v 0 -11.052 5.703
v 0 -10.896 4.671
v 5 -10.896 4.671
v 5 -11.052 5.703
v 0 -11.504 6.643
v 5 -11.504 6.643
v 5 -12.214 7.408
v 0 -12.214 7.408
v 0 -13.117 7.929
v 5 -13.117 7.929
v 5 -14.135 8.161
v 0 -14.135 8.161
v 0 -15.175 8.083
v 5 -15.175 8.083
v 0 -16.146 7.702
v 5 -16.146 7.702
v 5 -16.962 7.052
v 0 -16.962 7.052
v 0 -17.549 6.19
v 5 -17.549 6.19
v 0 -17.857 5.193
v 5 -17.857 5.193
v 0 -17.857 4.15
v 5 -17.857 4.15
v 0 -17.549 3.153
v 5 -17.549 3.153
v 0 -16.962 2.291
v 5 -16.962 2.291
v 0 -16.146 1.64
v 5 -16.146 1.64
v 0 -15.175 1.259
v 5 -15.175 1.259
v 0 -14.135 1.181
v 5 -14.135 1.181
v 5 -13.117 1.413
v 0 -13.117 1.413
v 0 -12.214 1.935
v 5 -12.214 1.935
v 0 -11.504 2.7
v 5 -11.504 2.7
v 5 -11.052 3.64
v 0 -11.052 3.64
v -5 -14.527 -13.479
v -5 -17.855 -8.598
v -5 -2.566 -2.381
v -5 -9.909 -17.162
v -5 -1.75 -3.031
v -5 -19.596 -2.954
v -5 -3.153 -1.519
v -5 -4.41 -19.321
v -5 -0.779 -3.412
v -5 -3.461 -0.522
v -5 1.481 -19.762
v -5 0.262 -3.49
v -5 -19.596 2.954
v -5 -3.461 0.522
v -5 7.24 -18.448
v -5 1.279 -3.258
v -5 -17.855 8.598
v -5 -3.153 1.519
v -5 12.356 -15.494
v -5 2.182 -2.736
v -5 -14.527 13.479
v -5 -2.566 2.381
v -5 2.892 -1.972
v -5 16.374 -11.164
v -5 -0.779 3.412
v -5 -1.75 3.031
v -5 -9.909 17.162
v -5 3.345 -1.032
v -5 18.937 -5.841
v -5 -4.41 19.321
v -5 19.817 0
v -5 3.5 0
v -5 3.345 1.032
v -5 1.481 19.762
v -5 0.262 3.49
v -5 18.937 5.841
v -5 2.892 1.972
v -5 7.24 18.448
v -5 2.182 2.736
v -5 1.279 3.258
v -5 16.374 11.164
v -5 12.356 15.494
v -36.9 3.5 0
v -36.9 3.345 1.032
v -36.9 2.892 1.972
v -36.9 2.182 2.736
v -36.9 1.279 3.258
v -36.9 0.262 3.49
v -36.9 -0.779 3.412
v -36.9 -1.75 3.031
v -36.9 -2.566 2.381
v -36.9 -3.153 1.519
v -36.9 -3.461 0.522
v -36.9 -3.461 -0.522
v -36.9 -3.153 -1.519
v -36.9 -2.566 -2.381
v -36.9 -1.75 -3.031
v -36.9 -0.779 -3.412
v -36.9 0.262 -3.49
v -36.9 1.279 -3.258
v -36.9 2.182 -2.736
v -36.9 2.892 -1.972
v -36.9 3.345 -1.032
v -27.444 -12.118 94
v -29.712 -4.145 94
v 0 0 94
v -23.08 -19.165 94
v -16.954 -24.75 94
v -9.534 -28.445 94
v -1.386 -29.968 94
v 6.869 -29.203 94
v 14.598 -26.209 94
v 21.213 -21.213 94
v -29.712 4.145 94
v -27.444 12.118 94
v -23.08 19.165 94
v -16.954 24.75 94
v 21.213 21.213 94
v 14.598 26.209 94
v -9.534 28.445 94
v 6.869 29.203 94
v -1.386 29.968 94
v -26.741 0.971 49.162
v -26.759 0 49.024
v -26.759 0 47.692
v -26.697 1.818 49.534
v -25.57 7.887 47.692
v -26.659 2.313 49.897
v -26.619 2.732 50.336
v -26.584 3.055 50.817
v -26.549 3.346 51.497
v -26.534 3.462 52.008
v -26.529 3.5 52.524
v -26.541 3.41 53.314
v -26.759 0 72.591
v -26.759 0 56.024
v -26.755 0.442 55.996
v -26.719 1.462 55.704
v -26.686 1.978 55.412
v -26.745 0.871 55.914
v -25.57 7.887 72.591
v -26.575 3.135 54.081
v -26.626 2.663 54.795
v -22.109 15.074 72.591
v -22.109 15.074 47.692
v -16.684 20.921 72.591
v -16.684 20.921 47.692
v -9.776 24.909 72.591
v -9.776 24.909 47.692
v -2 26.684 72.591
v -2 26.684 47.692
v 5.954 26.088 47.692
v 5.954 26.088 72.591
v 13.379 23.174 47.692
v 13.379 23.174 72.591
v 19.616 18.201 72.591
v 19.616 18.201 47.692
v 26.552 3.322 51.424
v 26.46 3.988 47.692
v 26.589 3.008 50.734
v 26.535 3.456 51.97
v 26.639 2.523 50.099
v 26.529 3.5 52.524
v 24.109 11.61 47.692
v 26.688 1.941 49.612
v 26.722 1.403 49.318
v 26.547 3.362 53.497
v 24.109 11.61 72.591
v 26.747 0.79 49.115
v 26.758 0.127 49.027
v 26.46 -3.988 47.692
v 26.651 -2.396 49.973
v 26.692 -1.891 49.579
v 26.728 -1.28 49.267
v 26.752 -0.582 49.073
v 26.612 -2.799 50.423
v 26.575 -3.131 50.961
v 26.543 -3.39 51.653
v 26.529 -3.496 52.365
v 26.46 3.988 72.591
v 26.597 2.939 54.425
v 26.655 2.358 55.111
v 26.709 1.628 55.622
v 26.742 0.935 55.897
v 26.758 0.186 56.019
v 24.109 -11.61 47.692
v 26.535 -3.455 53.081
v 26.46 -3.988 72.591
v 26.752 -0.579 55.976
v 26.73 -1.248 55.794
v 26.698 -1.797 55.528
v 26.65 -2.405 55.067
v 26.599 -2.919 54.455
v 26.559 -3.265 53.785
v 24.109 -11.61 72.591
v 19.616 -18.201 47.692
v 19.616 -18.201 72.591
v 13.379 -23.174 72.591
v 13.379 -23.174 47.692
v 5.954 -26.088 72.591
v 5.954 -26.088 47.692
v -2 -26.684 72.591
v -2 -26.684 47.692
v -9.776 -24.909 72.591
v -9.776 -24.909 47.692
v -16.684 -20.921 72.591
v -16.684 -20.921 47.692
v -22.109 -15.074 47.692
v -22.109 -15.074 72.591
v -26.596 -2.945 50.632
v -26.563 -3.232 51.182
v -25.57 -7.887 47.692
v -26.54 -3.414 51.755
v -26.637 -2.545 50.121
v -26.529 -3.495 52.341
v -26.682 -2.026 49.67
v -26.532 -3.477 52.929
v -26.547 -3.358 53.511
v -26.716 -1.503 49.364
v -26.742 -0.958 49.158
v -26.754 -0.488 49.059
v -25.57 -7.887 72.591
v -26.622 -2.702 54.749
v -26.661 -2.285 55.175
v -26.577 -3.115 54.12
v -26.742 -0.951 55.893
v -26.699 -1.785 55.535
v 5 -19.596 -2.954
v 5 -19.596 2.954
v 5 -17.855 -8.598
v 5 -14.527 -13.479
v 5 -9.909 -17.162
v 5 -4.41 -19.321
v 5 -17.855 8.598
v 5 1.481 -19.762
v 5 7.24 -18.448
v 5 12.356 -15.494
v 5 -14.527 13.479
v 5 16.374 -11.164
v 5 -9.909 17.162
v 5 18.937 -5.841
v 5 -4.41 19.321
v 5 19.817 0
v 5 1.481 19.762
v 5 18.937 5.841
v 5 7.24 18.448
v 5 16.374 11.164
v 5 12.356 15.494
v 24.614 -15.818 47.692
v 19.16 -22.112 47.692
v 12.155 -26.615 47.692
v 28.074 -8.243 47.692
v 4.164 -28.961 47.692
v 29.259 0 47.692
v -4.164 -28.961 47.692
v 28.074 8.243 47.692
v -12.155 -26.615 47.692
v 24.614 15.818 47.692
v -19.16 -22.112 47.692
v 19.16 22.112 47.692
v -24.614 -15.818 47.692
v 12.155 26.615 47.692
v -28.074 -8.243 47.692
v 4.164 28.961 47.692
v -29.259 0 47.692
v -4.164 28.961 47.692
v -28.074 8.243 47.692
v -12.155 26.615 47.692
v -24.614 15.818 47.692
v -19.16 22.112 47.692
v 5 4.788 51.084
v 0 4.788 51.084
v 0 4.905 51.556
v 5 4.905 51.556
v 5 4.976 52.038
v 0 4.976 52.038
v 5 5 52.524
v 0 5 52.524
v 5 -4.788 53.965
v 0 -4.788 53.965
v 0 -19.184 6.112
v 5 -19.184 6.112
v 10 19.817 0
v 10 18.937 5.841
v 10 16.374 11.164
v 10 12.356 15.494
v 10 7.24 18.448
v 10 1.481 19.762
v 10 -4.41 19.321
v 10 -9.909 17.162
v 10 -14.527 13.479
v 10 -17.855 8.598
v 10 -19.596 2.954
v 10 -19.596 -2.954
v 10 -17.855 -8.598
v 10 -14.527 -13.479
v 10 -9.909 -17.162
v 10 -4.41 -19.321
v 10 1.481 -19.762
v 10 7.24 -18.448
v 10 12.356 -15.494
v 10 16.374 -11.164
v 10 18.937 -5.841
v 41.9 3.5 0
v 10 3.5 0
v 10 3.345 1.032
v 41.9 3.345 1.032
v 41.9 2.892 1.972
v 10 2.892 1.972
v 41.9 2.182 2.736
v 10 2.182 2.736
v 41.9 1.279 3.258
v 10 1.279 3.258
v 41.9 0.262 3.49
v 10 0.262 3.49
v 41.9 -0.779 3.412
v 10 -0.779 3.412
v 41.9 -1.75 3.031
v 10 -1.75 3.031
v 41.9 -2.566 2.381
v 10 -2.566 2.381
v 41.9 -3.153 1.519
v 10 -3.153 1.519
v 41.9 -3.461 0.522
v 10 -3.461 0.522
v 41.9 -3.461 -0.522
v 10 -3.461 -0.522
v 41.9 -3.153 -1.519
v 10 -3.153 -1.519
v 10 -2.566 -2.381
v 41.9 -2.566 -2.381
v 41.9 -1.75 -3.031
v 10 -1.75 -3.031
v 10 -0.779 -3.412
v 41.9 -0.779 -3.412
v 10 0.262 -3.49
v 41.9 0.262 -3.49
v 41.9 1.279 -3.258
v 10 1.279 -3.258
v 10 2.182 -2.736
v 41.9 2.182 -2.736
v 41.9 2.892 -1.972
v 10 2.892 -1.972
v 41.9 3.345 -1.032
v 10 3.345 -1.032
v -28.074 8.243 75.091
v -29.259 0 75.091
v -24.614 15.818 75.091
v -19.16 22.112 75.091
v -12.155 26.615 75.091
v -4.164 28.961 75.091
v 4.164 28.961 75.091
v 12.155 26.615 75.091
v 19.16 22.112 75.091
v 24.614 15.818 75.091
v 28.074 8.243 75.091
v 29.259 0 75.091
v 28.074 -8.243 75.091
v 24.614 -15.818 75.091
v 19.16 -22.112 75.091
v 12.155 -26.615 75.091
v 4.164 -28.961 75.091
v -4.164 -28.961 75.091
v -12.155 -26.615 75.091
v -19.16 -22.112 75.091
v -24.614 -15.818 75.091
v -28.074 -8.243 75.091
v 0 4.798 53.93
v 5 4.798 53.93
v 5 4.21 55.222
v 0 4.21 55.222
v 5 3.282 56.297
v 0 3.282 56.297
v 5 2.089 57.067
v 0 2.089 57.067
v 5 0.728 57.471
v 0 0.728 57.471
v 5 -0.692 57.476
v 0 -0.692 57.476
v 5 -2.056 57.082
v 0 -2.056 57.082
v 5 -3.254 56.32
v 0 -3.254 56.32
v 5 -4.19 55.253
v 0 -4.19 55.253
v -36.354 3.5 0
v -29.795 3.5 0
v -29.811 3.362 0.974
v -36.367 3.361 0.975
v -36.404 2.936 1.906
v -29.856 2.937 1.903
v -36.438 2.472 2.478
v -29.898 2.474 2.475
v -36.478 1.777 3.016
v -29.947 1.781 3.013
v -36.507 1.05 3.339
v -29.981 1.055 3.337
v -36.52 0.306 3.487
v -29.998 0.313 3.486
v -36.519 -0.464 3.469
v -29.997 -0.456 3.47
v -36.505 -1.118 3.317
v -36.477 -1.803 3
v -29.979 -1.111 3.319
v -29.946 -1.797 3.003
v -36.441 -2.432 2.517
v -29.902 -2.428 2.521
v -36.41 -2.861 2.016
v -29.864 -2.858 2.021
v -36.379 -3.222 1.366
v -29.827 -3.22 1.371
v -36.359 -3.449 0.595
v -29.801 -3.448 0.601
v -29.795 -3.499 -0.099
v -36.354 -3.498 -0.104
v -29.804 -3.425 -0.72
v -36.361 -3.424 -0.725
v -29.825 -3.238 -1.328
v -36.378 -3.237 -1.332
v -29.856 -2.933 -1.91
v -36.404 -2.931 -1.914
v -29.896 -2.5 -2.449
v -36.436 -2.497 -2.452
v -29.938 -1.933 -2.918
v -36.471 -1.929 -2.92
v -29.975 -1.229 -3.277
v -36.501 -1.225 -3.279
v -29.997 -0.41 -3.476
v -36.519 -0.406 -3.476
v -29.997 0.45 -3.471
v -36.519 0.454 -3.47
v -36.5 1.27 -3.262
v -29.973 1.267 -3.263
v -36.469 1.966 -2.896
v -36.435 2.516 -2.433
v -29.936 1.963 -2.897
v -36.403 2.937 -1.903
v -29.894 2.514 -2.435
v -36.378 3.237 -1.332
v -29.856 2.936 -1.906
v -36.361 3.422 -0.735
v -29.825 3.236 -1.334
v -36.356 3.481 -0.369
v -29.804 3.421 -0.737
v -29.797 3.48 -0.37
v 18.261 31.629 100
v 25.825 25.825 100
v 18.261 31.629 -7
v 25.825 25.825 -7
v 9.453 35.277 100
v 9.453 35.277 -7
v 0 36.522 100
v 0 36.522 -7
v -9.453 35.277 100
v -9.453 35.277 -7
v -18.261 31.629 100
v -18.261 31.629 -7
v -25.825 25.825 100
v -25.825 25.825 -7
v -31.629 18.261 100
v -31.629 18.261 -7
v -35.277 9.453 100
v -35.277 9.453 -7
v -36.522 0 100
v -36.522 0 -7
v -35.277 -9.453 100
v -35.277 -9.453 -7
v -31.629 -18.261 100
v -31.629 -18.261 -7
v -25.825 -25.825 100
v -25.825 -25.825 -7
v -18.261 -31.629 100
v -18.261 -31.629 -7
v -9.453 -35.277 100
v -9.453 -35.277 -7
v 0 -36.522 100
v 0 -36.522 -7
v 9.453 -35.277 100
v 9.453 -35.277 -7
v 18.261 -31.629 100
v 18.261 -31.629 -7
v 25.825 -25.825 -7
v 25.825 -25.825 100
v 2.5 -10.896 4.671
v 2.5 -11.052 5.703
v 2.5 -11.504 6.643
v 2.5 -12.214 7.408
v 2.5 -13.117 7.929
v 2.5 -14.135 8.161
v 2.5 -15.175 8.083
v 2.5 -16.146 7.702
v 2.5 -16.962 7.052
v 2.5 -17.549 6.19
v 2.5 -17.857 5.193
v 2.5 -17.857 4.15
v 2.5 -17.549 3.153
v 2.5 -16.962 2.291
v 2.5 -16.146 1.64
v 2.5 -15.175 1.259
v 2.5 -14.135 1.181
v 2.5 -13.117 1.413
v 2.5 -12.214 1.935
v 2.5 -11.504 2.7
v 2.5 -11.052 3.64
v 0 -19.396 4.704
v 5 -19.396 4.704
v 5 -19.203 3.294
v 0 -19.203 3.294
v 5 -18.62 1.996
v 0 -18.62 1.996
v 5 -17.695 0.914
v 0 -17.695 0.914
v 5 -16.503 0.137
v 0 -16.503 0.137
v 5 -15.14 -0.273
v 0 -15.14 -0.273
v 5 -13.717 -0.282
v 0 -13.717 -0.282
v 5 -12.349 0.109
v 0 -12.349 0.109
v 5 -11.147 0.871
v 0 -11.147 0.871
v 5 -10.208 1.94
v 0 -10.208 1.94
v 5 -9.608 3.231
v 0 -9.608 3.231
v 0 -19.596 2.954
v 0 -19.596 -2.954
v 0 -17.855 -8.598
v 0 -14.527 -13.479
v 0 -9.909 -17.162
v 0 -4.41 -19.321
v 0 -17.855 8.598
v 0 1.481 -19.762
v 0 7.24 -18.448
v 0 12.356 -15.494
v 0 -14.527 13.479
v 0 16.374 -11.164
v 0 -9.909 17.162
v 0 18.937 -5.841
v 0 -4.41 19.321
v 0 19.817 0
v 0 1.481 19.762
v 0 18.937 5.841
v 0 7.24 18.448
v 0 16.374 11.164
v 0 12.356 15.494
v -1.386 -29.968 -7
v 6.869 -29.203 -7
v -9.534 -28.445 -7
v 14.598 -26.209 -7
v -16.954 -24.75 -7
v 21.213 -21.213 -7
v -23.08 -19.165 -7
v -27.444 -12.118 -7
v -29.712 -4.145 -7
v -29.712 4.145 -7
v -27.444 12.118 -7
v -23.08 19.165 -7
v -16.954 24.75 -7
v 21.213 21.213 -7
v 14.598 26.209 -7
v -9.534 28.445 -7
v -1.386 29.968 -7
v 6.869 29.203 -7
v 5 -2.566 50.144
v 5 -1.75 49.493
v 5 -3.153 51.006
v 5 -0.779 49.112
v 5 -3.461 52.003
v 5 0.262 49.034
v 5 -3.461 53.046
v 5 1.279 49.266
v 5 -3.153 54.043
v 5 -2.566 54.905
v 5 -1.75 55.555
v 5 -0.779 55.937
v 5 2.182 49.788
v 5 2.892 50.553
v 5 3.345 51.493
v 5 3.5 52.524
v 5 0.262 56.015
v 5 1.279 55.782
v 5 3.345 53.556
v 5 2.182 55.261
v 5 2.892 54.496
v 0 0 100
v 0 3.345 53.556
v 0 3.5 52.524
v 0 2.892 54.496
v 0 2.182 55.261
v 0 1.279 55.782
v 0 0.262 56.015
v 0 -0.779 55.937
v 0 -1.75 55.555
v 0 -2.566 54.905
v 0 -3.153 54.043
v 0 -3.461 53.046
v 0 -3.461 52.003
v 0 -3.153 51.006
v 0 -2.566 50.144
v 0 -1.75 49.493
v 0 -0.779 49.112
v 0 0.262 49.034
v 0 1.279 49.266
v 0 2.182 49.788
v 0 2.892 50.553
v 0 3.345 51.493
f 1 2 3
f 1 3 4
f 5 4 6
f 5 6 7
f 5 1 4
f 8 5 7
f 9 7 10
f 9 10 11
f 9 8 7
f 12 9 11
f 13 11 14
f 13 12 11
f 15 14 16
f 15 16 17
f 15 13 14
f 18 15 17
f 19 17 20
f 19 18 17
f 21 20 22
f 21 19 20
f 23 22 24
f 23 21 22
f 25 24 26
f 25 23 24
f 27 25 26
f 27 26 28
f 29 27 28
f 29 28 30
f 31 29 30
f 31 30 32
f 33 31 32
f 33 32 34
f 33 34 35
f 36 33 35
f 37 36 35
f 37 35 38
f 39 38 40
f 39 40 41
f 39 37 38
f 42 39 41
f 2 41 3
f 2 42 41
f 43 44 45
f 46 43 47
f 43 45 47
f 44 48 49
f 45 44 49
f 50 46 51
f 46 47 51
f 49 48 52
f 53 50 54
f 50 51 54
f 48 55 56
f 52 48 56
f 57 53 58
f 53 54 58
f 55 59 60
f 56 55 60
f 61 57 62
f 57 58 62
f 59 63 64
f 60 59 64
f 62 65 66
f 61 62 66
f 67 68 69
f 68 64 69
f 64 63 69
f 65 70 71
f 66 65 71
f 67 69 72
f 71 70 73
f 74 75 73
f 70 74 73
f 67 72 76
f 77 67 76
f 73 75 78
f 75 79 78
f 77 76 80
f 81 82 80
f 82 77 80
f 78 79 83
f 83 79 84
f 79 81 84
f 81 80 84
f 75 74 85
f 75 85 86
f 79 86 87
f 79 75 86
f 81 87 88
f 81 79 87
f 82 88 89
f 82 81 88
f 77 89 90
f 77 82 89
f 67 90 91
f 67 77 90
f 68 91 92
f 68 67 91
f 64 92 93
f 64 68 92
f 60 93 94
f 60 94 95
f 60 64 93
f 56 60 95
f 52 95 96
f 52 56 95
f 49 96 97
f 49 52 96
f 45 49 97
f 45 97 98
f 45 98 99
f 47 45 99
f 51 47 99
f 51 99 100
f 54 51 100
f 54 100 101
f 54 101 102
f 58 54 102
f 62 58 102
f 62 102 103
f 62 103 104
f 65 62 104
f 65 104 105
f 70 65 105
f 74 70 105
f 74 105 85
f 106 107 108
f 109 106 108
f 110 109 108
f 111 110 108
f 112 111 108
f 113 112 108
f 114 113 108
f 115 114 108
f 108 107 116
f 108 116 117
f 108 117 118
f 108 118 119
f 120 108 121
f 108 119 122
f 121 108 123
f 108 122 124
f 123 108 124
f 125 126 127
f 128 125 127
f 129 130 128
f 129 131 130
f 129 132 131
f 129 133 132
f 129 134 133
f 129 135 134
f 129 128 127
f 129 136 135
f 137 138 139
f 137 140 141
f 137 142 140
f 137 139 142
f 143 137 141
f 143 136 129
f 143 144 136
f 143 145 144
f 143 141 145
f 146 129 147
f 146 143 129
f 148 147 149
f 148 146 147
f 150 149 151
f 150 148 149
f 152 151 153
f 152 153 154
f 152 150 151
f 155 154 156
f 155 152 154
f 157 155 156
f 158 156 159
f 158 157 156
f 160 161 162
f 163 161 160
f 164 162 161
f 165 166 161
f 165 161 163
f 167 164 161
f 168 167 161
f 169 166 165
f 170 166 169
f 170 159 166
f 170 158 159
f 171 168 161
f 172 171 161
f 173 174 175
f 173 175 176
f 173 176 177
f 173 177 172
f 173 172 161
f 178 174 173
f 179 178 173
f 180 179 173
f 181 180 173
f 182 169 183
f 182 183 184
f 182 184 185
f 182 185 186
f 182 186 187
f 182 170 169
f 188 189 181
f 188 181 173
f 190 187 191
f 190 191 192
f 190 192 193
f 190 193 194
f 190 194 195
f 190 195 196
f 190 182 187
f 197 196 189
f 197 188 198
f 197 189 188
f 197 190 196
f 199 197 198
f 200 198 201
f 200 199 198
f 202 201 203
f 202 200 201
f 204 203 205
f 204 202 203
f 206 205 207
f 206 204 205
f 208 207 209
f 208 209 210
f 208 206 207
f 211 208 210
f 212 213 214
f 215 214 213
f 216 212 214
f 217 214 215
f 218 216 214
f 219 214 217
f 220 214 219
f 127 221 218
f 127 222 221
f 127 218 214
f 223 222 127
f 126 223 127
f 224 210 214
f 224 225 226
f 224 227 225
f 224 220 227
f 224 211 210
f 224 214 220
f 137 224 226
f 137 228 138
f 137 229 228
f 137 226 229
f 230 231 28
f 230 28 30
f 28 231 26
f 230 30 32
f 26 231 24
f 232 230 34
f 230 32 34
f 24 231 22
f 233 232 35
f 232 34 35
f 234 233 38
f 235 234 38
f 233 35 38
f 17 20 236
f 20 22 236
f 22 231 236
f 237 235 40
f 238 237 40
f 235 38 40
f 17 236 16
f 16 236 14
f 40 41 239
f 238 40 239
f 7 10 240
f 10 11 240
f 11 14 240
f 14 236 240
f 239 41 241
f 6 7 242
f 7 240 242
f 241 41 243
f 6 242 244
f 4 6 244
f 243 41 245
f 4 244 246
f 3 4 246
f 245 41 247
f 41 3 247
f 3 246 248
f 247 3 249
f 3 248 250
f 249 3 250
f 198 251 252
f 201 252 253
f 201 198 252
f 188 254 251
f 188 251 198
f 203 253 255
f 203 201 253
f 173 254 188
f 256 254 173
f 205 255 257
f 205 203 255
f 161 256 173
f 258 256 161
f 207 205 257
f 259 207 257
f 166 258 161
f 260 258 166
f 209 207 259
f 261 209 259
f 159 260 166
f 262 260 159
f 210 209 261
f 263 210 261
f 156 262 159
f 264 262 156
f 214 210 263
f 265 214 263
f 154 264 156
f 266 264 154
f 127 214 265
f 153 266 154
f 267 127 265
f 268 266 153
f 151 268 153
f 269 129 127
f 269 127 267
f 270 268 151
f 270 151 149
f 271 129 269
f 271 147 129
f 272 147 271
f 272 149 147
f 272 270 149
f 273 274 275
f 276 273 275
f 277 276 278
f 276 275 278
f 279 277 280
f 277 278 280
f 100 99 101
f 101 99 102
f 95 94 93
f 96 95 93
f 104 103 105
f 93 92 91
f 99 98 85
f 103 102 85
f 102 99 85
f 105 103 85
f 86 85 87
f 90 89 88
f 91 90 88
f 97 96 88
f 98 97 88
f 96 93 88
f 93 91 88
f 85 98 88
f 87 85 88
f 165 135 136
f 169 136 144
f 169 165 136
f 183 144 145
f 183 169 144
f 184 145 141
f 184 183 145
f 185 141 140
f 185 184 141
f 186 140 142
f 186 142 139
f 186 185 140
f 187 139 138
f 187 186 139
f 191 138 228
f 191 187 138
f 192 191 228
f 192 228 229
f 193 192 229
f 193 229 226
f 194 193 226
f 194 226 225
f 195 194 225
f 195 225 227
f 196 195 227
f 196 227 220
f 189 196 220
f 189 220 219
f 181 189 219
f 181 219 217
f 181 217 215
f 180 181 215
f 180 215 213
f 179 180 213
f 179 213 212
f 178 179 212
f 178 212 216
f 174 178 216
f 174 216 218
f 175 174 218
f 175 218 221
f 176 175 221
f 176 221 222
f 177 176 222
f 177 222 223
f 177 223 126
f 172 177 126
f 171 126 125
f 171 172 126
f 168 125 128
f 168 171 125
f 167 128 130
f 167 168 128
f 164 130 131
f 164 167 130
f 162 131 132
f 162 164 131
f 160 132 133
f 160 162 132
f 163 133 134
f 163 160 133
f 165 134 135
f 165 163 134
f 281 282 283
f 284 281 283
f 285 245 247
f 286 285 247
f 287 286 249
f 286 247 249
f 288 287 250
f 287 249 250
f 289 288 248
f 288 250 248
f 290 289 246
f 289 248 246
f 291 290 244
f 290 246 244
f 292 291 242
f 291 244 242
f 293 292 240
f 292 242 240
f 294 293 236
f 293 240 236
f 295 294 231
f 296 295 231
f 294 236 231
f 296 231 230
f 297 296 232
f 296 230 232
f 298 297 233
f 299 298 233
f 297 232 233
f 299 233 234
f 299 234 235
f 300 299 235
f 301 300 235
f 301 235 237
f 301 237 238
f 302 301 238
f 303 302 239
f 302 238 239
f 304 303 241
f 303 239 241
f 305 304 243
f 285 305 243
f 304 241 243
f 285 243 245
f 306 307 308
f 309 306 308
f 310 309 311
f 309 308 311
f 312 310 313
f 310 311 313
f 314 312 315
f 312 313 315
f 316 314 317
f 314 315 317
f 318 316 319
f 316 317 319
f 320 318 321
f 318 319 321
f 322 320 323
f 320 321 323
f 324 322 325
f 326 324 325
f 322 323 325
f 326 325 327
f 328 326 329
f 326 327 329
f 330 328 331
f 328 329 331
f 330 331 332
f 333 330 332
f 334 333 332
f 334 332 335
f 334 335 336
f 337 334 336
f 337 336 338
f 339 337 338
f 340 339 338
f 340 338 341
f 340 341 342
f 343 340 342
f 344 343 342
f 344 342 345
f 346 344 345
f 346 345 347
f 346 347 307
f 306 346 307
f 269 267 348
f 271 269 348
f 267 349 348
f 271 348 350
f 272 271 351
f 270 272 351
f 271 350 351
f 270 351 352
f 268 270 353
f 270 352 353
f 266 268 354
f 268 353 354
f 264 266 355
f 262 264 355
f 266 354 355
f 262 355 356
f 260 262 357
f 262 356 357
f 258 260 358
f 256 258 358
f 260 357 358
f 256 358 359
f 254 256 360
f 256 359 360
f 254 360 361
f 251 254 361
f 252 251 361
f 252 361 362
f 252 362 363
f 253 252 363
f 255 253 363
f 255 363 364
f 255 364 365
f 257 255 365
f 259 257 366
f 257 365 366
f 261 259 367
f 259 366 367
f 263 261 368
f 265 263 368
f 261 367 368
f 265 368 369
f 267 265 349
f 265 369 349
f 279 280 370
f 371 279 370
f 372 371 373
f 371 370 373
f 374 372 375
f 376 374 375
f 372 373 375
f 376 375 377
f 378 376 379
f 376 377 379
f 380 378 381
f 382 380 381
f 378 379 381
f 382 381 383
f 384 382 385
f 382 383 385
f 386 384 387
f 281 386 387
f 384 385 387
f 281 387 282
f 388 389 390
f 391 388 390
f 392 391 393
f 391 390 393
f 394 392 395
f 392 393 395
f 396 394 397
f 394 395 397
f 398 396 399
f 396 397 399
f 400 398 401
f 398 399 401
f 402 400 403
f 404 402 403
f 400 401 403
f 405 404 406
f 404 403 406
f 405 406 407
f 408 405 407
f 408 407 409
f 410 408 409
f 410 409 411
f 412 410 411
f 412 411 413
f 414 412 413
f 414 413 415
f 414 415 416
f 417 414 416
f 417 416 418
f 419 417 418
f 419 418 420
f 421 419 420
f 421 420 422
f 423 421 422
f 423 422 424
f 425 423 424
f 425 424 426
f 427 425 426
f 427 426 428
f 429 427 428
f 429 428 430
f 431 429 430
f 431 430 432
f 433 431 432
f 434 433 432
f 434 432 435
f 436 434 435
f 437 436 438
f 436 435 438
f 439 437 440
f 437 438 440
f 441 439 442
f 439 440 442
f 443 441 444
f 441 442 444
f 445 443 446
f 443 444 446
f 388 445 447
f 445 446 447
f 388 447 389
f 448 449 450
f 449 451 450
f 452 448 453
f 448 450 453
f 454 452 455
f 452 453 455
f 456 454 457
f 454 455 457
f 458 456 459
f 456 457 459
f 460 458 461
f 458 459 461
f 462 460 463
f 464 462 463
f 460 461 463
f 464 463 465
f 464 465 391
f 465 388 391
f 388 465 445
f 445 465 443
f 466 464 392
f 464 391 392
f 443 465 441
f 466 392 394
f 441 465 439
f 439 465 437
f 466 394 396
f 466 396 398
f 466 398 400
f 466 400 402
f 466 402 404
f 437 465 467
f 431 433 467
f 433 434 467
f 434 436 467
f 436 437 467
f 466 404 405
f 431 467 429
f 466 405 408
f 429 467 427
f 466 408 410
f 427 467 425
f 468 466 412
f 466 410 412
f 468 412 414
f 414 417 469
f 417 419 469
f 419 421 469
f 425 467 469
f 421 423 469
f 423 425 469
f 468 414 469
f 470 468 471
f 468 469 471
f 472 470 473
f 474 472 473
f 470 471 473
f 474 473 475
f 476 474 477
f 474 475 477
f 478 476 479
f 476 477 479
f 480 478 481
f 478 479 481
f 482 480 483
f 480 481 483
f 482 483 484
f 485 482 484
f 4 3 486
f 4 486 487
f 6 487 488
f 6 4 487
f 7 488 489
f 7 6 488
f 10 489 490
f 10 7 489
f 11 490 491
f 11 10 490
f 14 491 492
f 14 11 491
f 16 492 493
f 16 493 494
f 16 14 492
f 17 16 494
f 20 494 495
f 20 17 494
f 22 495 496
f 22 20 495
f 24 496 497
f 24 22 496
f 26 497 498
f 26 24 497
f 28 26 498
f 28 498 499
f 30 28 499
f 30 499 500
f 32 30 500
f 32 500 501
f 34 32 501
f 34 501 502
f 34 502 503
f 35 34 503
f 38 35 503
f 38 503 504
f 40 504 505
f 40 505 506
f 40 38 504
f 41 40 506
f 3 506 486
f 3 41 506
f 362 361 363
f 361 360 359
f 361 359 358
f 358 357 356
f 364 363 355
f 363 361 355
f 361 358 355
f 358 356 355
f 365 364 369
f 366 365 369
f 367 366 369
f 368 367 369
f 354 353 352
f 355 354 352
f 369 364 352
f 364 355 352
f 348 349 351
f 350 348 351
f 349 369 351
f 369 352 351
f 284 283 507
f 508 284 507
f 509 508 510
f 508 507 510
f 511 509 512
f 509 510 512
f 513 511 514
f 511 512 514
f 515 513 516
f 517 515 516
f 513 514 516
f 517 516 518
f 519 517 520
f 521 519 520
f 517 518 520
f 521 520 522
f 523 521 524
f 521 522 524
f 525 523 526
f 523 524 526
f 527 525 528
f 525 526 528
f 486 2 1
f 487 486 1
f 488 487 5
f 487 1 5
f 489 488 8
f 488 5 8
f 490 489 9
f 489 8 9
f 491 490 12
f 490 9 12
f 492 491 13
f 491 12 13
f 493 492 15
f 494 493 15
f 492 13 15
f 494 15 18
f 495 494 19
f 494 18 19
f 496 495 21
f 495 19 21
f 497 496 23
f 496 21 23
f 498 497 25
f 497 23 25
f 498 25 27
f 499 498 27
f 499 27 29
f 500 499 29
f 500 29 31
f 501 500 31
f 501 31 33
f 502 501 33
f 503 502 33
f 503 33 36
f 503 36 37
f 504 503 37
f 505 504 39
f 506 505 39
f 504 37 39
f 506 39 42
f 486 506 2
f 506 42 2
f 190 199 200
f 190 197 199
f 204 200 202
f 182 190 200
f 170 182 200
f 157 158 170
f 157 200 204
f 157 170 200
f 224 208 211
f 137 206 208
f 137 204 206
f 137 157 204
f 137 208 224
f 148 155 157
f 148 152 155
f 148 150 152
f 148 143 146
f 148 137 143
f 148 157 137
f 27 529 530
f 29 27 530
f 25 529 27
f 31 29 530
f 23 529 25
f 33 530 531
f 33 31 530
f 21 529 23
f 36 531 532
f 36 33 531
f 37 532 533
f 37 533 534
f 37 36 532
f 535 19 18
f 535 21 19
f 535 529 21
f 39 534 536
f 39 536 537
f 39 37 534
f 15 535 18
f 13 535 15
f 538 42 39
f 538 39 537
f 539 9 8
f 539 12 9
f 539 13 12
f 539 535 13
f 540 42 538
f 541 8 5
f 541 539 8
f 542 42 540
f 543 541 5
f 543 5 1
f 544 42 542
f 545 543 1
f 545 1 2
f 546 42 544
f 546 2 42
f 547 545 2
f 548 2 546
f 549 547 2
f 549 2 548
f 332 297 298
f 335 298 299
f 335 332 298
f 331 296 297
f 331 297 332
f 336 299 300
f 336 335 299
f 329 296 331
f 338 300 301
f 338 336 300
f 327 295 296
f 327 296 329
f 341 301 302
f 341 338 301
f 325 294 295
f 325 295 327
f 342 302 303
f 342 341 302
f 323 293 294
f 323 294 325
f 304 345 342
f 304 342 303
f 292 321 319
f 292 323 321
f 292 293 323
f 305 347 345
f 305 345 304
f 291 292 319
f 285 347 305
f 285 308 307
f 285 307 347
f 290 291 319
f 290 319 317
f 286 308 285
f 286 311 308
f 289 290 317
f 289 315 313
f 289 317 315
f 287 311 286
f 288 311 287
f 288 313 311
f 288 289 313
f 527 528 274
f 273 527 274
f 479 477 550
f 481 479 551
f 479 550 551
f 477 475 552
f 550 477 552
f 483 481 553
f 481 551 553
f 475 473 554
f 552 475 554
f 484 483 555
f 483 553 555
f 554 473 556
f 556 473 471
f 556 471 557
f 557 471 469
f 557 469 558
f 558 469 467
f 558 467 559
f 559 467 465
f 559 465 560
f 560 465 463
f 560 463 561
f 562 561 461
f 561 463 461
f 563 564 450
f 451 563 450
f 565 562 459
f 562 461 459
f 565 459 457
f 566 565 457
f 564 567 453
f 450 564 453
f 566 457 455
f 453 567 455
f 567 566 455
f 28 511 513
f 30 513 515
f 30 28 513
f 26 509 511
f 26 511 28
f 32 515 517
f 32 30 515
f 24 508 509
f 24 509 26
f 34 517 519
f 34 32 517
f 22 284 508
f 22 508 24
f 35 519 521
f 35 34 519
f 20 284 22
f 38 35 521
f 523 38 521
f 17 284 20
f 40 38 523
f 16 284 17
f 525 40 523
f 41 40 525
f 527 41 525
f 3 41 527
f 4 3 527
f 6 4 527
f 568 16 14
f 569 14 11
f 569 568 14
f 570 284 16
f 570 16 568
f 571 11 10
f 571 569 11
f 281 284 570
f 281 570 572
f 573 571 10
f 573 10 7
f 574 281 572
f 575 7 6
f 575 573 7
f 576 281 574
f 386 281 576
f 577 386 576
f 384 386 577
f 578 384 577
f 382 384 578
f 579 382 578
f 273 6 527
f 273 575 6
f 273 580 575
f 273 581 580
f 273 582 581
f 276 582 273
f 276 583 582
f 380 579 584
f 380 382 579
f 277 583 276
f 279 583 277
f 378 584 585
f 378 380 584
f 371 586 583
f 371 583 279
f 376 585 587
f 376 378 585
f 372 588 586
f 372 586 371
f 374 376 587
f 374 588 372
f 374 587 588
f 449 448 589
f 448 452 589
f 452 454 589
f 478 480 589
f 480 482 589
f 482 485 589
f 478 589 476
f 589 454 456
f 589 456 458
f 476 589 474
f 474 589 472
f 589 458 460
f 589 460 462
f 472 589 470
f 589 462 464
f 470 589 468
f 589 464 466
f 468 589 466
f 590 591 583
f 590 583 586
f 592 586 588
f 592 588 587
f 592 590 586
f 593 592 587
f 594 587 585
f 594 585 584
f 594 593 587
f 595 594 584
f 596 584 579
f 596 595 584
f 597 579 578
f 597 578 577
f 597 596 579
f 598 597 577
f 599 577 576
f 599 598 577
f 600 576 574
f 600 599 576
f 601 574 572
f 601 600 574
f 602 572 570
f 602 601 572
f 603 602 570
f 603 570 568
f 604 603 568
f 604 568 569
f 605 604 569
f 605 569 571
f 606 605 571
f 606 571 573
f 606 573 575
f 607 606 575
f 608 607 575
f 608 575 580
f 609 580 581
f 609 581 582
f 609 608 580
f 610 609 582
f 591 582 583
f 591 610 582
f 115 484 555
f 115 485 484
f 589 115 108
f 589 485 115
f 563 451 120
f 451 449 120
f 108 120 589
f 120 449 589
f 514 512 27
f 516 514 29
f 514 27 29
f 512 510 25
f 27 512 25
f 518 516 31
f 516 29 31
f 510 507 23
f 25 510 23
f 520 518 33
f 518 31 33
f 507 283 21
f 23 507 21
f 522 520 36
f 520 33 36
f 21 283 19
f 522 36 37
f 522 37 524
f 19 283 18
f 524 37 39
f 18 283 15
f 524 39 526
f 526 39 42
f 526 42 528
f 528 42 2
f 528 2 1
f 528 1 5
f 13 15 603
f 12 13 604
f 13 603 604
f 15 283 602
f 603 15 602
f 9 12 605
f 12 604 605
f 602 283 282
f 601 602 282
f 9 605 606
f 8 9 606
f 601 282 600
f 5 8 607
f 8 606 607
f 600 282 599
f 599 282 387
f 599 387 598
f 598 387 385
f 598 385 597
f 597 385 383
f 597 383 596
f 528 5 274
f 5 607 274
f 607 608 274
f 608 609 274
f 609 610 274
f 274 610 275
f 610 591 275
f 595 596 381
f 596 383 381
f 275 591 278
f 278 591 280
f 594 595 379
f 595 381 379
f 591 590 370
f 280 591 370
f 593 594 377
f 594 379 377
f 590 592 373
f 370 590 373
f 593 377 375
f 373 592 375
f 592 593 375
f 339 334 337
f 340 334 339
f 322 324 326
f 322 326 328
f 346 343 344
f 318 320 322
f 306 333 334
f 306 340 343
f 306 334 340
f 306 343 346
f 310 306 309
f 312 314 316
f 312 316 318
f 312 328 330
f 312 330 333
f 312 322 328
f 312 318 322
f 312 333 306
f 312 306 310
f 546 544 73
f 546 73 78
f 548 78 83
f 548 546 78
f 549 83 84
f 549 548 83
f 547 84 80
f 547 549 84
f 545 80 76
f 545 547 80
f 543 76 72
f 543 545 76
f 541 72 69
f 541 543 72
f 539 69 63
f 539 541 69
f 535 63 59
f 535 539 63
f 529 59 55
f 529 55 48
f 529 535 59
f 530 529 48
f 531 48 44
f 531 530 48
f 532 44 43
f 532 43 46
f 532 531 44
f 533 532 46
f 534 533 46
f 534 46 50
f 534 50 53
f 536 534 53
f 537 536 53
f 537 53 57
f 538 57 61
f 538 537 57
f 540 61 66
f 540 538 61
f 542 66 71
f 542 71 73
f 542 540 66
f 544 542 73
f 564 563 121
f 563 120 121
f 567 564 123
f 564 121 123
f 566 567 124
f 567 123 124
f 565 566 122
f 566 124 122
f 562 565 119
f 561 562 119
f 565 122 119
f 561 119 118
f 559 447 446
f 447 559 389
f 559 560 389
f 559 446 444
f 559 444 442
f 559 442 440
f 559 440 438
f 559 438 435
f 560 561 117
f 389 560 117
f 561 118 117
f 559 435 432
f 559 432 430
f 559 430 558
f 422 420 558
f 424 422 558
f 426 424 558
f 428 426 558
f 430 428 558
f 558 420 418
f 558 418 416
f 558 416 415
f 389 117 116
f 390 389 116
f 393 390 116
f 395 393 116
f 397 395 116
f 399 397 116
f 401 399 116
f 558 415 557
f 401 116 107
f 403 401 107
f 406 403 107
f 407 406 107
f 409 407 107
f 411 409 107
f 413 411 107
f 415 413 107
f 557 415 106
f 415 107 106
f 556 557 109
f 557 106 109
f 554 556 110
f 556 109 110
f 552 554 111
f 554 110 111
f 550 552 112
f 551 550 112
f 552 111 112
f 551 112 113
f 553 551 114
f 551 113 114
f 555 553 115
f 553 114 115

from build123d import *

# Parameters (mm, degrees)
F1_ANGLE_BACK = 135
F1_ANGLE      = 270
F2_R          = 3.5
F3_DEPTH      = 36.5227397509
F4_R          = 3.5
F5_DEPTH      = 36.9
F6_R          = 19.8174846099
F7_DEPTH      = 5
F8_R          = 3.5
F9_DEPTH      = 2.5
F10_W         = 29.2587447912
F10_H         = 27.3991972208
F12_T         = -2.5
F13_R         = 3.5
F14_DEPTH     = 28.8
F15_R         = 3.5
F16_DEPTH     = 5


with BuildPart() as f1:
    # F0 (on Front) → F1 (revolve)
    with BuildSketch(Plane.XZ, mode=Mode.PRIVATE) as f1_sk:
        Polygon((-36.5217397509, -7), (-30, -7), (-30, 94), (0, 94), (0, 100), (-36.5217397509, 100), align=None)
    revolve(f1_sk.sketch.rotate(Axis((0, 0, 97), (0, 0, 1)), -F1_ANGLE_BACK), axis=Axis((0, 0, 97), (0, 0, 1)), revolution_arc=F1_ANGLE)

    # F2 (on Right) → F3 (cut, through all)
    with BuildSketch(Plane.YZ):
        Circle(F2_R)
    extrude(amount=-F3_DEPTH, mode=Mode.SUBTRACT)


with BuildPart() as f5:
    # F4 (on Right) → F5 (new body)
    with BuildSketch(Plane.YZ):
        Circle(F4_R)
    extrude(amount=-F5_DEPTH)

    # F6 (on face) → F7 (join)
    with BuildSketch(Plane.YZ):
        Circle(F6_R)
    extrude(amount=-F7_DEPTH)

    # F8 (on face) → F9 (join)
    with BuildSketch(Plane.YZ):
        with Locations((-14.3960574642, 4.6712458134)):
            Circle(F8_R)
    extrude(amount=F9_DEPTH)

    # F17: F5 across face


with BuildPart() as f11:
    # F10 (on Front) → F11 (revolve)
    with BuildSketch(Plane.XZ):
        with Locations((-14.6293723956, 61.3911896944)):
            Rectangle(F10_W, F10_H)
    revolve(axis=Axis((0, 0, 61.3911896944), (0, 0, -1)))

    # F12
    f12_openings = [f11.faces().sort_by_distance(p)[0] for p in [
        (0, 0, 47.691591),
    ]]
    offset(amount=F12_T, openings=f12_openings)

    # F13 (on Right) → F14 (join, symmetric)
    with BuildSketch(Plane.YZ):
        with Locations((0, 52.5243282318)):
            Circle(F13_R)
    extrude(amount=F14_DEPTH, both=True)


with BuildPart() as f16:
    # F15 (on Right) → F16 (new body)
    with BuildSketch(Plane.YZ):
        with BuildLine():
            ThreePointArc((4.7880248113, 51.0839052363), (4.9467223521, 51.7963598454), (5, 52.5243282318))
            ThreePointArc((5, 52.5243282318), (0.7279683865, 57.4710505839), (-4.7880248113, 53.9647512274))
            ThreePointArc((-4.7880248113, 53.9647512274), (-1.4404229956, 47.7363034205), (4.7880248113, 51.0839052363))
        make_face()
        with Locations((0, 52.5243282318)):
            Circle(F15_R, mode=Mode.SUBTRACT)
        with BuildLine():
            ThreePointArc((4.7880248113, 51.0839052363), (-1.4404229956, 47.7363034205), (-4.7880248113, 53.9647512274))
            Line((-4.7880248113, 53.9647512274), (-19.1840822755, 6.1116688089))
            ThreePointArc((-19.1840822755, 6.1116688089), (-13.6680890777, 9.6179681654), (-9.3960574642, 4.6712458134))
            ThreePointArc((-9.3960574642, 4.6712458134), (-9.4493351121, 3.9432774269), (-9.6080326529, 3.2308228178))
            Line((-9.6080326529, 3.2308228178), (4.7880248113, 51.0839052363))
        make_face()
        with BuildLine():
            ThreePointArc((-9.3960574642, 4.6712458134), (-13.6680890777, 9.6179681654), (-19.1840822755, 6.1116688089))
            ThreePointArc((-19.1840822755, 6.1116688089), (-15.8364804597, -0.116778998), (-9.6080326529, 3.2308228178))
            ThreePointArc((-9.6080326529, 3.2308228178), (-9.4493351121, 3.9432774269), (-9.3960574642, 4.6712458134))
        make_face()
        with Locations((-14.3960574642, 4.6712458134)):
            Circle(F15_R, mode=Mode.SUBTRACT)
    extrude(amount=F16_DEPTH)


with BuildPart() as f5_1:
    add(f5.part)
    add(f5.part.mirror(Plane(origin=(2.5, -14.3960574642, 4.6712458134), x_dir=(0, 1, 0), z_dir=(1, 0, 0))))


solid = Compound([f1.part, f11.part, f16.part, f5_1.part])
